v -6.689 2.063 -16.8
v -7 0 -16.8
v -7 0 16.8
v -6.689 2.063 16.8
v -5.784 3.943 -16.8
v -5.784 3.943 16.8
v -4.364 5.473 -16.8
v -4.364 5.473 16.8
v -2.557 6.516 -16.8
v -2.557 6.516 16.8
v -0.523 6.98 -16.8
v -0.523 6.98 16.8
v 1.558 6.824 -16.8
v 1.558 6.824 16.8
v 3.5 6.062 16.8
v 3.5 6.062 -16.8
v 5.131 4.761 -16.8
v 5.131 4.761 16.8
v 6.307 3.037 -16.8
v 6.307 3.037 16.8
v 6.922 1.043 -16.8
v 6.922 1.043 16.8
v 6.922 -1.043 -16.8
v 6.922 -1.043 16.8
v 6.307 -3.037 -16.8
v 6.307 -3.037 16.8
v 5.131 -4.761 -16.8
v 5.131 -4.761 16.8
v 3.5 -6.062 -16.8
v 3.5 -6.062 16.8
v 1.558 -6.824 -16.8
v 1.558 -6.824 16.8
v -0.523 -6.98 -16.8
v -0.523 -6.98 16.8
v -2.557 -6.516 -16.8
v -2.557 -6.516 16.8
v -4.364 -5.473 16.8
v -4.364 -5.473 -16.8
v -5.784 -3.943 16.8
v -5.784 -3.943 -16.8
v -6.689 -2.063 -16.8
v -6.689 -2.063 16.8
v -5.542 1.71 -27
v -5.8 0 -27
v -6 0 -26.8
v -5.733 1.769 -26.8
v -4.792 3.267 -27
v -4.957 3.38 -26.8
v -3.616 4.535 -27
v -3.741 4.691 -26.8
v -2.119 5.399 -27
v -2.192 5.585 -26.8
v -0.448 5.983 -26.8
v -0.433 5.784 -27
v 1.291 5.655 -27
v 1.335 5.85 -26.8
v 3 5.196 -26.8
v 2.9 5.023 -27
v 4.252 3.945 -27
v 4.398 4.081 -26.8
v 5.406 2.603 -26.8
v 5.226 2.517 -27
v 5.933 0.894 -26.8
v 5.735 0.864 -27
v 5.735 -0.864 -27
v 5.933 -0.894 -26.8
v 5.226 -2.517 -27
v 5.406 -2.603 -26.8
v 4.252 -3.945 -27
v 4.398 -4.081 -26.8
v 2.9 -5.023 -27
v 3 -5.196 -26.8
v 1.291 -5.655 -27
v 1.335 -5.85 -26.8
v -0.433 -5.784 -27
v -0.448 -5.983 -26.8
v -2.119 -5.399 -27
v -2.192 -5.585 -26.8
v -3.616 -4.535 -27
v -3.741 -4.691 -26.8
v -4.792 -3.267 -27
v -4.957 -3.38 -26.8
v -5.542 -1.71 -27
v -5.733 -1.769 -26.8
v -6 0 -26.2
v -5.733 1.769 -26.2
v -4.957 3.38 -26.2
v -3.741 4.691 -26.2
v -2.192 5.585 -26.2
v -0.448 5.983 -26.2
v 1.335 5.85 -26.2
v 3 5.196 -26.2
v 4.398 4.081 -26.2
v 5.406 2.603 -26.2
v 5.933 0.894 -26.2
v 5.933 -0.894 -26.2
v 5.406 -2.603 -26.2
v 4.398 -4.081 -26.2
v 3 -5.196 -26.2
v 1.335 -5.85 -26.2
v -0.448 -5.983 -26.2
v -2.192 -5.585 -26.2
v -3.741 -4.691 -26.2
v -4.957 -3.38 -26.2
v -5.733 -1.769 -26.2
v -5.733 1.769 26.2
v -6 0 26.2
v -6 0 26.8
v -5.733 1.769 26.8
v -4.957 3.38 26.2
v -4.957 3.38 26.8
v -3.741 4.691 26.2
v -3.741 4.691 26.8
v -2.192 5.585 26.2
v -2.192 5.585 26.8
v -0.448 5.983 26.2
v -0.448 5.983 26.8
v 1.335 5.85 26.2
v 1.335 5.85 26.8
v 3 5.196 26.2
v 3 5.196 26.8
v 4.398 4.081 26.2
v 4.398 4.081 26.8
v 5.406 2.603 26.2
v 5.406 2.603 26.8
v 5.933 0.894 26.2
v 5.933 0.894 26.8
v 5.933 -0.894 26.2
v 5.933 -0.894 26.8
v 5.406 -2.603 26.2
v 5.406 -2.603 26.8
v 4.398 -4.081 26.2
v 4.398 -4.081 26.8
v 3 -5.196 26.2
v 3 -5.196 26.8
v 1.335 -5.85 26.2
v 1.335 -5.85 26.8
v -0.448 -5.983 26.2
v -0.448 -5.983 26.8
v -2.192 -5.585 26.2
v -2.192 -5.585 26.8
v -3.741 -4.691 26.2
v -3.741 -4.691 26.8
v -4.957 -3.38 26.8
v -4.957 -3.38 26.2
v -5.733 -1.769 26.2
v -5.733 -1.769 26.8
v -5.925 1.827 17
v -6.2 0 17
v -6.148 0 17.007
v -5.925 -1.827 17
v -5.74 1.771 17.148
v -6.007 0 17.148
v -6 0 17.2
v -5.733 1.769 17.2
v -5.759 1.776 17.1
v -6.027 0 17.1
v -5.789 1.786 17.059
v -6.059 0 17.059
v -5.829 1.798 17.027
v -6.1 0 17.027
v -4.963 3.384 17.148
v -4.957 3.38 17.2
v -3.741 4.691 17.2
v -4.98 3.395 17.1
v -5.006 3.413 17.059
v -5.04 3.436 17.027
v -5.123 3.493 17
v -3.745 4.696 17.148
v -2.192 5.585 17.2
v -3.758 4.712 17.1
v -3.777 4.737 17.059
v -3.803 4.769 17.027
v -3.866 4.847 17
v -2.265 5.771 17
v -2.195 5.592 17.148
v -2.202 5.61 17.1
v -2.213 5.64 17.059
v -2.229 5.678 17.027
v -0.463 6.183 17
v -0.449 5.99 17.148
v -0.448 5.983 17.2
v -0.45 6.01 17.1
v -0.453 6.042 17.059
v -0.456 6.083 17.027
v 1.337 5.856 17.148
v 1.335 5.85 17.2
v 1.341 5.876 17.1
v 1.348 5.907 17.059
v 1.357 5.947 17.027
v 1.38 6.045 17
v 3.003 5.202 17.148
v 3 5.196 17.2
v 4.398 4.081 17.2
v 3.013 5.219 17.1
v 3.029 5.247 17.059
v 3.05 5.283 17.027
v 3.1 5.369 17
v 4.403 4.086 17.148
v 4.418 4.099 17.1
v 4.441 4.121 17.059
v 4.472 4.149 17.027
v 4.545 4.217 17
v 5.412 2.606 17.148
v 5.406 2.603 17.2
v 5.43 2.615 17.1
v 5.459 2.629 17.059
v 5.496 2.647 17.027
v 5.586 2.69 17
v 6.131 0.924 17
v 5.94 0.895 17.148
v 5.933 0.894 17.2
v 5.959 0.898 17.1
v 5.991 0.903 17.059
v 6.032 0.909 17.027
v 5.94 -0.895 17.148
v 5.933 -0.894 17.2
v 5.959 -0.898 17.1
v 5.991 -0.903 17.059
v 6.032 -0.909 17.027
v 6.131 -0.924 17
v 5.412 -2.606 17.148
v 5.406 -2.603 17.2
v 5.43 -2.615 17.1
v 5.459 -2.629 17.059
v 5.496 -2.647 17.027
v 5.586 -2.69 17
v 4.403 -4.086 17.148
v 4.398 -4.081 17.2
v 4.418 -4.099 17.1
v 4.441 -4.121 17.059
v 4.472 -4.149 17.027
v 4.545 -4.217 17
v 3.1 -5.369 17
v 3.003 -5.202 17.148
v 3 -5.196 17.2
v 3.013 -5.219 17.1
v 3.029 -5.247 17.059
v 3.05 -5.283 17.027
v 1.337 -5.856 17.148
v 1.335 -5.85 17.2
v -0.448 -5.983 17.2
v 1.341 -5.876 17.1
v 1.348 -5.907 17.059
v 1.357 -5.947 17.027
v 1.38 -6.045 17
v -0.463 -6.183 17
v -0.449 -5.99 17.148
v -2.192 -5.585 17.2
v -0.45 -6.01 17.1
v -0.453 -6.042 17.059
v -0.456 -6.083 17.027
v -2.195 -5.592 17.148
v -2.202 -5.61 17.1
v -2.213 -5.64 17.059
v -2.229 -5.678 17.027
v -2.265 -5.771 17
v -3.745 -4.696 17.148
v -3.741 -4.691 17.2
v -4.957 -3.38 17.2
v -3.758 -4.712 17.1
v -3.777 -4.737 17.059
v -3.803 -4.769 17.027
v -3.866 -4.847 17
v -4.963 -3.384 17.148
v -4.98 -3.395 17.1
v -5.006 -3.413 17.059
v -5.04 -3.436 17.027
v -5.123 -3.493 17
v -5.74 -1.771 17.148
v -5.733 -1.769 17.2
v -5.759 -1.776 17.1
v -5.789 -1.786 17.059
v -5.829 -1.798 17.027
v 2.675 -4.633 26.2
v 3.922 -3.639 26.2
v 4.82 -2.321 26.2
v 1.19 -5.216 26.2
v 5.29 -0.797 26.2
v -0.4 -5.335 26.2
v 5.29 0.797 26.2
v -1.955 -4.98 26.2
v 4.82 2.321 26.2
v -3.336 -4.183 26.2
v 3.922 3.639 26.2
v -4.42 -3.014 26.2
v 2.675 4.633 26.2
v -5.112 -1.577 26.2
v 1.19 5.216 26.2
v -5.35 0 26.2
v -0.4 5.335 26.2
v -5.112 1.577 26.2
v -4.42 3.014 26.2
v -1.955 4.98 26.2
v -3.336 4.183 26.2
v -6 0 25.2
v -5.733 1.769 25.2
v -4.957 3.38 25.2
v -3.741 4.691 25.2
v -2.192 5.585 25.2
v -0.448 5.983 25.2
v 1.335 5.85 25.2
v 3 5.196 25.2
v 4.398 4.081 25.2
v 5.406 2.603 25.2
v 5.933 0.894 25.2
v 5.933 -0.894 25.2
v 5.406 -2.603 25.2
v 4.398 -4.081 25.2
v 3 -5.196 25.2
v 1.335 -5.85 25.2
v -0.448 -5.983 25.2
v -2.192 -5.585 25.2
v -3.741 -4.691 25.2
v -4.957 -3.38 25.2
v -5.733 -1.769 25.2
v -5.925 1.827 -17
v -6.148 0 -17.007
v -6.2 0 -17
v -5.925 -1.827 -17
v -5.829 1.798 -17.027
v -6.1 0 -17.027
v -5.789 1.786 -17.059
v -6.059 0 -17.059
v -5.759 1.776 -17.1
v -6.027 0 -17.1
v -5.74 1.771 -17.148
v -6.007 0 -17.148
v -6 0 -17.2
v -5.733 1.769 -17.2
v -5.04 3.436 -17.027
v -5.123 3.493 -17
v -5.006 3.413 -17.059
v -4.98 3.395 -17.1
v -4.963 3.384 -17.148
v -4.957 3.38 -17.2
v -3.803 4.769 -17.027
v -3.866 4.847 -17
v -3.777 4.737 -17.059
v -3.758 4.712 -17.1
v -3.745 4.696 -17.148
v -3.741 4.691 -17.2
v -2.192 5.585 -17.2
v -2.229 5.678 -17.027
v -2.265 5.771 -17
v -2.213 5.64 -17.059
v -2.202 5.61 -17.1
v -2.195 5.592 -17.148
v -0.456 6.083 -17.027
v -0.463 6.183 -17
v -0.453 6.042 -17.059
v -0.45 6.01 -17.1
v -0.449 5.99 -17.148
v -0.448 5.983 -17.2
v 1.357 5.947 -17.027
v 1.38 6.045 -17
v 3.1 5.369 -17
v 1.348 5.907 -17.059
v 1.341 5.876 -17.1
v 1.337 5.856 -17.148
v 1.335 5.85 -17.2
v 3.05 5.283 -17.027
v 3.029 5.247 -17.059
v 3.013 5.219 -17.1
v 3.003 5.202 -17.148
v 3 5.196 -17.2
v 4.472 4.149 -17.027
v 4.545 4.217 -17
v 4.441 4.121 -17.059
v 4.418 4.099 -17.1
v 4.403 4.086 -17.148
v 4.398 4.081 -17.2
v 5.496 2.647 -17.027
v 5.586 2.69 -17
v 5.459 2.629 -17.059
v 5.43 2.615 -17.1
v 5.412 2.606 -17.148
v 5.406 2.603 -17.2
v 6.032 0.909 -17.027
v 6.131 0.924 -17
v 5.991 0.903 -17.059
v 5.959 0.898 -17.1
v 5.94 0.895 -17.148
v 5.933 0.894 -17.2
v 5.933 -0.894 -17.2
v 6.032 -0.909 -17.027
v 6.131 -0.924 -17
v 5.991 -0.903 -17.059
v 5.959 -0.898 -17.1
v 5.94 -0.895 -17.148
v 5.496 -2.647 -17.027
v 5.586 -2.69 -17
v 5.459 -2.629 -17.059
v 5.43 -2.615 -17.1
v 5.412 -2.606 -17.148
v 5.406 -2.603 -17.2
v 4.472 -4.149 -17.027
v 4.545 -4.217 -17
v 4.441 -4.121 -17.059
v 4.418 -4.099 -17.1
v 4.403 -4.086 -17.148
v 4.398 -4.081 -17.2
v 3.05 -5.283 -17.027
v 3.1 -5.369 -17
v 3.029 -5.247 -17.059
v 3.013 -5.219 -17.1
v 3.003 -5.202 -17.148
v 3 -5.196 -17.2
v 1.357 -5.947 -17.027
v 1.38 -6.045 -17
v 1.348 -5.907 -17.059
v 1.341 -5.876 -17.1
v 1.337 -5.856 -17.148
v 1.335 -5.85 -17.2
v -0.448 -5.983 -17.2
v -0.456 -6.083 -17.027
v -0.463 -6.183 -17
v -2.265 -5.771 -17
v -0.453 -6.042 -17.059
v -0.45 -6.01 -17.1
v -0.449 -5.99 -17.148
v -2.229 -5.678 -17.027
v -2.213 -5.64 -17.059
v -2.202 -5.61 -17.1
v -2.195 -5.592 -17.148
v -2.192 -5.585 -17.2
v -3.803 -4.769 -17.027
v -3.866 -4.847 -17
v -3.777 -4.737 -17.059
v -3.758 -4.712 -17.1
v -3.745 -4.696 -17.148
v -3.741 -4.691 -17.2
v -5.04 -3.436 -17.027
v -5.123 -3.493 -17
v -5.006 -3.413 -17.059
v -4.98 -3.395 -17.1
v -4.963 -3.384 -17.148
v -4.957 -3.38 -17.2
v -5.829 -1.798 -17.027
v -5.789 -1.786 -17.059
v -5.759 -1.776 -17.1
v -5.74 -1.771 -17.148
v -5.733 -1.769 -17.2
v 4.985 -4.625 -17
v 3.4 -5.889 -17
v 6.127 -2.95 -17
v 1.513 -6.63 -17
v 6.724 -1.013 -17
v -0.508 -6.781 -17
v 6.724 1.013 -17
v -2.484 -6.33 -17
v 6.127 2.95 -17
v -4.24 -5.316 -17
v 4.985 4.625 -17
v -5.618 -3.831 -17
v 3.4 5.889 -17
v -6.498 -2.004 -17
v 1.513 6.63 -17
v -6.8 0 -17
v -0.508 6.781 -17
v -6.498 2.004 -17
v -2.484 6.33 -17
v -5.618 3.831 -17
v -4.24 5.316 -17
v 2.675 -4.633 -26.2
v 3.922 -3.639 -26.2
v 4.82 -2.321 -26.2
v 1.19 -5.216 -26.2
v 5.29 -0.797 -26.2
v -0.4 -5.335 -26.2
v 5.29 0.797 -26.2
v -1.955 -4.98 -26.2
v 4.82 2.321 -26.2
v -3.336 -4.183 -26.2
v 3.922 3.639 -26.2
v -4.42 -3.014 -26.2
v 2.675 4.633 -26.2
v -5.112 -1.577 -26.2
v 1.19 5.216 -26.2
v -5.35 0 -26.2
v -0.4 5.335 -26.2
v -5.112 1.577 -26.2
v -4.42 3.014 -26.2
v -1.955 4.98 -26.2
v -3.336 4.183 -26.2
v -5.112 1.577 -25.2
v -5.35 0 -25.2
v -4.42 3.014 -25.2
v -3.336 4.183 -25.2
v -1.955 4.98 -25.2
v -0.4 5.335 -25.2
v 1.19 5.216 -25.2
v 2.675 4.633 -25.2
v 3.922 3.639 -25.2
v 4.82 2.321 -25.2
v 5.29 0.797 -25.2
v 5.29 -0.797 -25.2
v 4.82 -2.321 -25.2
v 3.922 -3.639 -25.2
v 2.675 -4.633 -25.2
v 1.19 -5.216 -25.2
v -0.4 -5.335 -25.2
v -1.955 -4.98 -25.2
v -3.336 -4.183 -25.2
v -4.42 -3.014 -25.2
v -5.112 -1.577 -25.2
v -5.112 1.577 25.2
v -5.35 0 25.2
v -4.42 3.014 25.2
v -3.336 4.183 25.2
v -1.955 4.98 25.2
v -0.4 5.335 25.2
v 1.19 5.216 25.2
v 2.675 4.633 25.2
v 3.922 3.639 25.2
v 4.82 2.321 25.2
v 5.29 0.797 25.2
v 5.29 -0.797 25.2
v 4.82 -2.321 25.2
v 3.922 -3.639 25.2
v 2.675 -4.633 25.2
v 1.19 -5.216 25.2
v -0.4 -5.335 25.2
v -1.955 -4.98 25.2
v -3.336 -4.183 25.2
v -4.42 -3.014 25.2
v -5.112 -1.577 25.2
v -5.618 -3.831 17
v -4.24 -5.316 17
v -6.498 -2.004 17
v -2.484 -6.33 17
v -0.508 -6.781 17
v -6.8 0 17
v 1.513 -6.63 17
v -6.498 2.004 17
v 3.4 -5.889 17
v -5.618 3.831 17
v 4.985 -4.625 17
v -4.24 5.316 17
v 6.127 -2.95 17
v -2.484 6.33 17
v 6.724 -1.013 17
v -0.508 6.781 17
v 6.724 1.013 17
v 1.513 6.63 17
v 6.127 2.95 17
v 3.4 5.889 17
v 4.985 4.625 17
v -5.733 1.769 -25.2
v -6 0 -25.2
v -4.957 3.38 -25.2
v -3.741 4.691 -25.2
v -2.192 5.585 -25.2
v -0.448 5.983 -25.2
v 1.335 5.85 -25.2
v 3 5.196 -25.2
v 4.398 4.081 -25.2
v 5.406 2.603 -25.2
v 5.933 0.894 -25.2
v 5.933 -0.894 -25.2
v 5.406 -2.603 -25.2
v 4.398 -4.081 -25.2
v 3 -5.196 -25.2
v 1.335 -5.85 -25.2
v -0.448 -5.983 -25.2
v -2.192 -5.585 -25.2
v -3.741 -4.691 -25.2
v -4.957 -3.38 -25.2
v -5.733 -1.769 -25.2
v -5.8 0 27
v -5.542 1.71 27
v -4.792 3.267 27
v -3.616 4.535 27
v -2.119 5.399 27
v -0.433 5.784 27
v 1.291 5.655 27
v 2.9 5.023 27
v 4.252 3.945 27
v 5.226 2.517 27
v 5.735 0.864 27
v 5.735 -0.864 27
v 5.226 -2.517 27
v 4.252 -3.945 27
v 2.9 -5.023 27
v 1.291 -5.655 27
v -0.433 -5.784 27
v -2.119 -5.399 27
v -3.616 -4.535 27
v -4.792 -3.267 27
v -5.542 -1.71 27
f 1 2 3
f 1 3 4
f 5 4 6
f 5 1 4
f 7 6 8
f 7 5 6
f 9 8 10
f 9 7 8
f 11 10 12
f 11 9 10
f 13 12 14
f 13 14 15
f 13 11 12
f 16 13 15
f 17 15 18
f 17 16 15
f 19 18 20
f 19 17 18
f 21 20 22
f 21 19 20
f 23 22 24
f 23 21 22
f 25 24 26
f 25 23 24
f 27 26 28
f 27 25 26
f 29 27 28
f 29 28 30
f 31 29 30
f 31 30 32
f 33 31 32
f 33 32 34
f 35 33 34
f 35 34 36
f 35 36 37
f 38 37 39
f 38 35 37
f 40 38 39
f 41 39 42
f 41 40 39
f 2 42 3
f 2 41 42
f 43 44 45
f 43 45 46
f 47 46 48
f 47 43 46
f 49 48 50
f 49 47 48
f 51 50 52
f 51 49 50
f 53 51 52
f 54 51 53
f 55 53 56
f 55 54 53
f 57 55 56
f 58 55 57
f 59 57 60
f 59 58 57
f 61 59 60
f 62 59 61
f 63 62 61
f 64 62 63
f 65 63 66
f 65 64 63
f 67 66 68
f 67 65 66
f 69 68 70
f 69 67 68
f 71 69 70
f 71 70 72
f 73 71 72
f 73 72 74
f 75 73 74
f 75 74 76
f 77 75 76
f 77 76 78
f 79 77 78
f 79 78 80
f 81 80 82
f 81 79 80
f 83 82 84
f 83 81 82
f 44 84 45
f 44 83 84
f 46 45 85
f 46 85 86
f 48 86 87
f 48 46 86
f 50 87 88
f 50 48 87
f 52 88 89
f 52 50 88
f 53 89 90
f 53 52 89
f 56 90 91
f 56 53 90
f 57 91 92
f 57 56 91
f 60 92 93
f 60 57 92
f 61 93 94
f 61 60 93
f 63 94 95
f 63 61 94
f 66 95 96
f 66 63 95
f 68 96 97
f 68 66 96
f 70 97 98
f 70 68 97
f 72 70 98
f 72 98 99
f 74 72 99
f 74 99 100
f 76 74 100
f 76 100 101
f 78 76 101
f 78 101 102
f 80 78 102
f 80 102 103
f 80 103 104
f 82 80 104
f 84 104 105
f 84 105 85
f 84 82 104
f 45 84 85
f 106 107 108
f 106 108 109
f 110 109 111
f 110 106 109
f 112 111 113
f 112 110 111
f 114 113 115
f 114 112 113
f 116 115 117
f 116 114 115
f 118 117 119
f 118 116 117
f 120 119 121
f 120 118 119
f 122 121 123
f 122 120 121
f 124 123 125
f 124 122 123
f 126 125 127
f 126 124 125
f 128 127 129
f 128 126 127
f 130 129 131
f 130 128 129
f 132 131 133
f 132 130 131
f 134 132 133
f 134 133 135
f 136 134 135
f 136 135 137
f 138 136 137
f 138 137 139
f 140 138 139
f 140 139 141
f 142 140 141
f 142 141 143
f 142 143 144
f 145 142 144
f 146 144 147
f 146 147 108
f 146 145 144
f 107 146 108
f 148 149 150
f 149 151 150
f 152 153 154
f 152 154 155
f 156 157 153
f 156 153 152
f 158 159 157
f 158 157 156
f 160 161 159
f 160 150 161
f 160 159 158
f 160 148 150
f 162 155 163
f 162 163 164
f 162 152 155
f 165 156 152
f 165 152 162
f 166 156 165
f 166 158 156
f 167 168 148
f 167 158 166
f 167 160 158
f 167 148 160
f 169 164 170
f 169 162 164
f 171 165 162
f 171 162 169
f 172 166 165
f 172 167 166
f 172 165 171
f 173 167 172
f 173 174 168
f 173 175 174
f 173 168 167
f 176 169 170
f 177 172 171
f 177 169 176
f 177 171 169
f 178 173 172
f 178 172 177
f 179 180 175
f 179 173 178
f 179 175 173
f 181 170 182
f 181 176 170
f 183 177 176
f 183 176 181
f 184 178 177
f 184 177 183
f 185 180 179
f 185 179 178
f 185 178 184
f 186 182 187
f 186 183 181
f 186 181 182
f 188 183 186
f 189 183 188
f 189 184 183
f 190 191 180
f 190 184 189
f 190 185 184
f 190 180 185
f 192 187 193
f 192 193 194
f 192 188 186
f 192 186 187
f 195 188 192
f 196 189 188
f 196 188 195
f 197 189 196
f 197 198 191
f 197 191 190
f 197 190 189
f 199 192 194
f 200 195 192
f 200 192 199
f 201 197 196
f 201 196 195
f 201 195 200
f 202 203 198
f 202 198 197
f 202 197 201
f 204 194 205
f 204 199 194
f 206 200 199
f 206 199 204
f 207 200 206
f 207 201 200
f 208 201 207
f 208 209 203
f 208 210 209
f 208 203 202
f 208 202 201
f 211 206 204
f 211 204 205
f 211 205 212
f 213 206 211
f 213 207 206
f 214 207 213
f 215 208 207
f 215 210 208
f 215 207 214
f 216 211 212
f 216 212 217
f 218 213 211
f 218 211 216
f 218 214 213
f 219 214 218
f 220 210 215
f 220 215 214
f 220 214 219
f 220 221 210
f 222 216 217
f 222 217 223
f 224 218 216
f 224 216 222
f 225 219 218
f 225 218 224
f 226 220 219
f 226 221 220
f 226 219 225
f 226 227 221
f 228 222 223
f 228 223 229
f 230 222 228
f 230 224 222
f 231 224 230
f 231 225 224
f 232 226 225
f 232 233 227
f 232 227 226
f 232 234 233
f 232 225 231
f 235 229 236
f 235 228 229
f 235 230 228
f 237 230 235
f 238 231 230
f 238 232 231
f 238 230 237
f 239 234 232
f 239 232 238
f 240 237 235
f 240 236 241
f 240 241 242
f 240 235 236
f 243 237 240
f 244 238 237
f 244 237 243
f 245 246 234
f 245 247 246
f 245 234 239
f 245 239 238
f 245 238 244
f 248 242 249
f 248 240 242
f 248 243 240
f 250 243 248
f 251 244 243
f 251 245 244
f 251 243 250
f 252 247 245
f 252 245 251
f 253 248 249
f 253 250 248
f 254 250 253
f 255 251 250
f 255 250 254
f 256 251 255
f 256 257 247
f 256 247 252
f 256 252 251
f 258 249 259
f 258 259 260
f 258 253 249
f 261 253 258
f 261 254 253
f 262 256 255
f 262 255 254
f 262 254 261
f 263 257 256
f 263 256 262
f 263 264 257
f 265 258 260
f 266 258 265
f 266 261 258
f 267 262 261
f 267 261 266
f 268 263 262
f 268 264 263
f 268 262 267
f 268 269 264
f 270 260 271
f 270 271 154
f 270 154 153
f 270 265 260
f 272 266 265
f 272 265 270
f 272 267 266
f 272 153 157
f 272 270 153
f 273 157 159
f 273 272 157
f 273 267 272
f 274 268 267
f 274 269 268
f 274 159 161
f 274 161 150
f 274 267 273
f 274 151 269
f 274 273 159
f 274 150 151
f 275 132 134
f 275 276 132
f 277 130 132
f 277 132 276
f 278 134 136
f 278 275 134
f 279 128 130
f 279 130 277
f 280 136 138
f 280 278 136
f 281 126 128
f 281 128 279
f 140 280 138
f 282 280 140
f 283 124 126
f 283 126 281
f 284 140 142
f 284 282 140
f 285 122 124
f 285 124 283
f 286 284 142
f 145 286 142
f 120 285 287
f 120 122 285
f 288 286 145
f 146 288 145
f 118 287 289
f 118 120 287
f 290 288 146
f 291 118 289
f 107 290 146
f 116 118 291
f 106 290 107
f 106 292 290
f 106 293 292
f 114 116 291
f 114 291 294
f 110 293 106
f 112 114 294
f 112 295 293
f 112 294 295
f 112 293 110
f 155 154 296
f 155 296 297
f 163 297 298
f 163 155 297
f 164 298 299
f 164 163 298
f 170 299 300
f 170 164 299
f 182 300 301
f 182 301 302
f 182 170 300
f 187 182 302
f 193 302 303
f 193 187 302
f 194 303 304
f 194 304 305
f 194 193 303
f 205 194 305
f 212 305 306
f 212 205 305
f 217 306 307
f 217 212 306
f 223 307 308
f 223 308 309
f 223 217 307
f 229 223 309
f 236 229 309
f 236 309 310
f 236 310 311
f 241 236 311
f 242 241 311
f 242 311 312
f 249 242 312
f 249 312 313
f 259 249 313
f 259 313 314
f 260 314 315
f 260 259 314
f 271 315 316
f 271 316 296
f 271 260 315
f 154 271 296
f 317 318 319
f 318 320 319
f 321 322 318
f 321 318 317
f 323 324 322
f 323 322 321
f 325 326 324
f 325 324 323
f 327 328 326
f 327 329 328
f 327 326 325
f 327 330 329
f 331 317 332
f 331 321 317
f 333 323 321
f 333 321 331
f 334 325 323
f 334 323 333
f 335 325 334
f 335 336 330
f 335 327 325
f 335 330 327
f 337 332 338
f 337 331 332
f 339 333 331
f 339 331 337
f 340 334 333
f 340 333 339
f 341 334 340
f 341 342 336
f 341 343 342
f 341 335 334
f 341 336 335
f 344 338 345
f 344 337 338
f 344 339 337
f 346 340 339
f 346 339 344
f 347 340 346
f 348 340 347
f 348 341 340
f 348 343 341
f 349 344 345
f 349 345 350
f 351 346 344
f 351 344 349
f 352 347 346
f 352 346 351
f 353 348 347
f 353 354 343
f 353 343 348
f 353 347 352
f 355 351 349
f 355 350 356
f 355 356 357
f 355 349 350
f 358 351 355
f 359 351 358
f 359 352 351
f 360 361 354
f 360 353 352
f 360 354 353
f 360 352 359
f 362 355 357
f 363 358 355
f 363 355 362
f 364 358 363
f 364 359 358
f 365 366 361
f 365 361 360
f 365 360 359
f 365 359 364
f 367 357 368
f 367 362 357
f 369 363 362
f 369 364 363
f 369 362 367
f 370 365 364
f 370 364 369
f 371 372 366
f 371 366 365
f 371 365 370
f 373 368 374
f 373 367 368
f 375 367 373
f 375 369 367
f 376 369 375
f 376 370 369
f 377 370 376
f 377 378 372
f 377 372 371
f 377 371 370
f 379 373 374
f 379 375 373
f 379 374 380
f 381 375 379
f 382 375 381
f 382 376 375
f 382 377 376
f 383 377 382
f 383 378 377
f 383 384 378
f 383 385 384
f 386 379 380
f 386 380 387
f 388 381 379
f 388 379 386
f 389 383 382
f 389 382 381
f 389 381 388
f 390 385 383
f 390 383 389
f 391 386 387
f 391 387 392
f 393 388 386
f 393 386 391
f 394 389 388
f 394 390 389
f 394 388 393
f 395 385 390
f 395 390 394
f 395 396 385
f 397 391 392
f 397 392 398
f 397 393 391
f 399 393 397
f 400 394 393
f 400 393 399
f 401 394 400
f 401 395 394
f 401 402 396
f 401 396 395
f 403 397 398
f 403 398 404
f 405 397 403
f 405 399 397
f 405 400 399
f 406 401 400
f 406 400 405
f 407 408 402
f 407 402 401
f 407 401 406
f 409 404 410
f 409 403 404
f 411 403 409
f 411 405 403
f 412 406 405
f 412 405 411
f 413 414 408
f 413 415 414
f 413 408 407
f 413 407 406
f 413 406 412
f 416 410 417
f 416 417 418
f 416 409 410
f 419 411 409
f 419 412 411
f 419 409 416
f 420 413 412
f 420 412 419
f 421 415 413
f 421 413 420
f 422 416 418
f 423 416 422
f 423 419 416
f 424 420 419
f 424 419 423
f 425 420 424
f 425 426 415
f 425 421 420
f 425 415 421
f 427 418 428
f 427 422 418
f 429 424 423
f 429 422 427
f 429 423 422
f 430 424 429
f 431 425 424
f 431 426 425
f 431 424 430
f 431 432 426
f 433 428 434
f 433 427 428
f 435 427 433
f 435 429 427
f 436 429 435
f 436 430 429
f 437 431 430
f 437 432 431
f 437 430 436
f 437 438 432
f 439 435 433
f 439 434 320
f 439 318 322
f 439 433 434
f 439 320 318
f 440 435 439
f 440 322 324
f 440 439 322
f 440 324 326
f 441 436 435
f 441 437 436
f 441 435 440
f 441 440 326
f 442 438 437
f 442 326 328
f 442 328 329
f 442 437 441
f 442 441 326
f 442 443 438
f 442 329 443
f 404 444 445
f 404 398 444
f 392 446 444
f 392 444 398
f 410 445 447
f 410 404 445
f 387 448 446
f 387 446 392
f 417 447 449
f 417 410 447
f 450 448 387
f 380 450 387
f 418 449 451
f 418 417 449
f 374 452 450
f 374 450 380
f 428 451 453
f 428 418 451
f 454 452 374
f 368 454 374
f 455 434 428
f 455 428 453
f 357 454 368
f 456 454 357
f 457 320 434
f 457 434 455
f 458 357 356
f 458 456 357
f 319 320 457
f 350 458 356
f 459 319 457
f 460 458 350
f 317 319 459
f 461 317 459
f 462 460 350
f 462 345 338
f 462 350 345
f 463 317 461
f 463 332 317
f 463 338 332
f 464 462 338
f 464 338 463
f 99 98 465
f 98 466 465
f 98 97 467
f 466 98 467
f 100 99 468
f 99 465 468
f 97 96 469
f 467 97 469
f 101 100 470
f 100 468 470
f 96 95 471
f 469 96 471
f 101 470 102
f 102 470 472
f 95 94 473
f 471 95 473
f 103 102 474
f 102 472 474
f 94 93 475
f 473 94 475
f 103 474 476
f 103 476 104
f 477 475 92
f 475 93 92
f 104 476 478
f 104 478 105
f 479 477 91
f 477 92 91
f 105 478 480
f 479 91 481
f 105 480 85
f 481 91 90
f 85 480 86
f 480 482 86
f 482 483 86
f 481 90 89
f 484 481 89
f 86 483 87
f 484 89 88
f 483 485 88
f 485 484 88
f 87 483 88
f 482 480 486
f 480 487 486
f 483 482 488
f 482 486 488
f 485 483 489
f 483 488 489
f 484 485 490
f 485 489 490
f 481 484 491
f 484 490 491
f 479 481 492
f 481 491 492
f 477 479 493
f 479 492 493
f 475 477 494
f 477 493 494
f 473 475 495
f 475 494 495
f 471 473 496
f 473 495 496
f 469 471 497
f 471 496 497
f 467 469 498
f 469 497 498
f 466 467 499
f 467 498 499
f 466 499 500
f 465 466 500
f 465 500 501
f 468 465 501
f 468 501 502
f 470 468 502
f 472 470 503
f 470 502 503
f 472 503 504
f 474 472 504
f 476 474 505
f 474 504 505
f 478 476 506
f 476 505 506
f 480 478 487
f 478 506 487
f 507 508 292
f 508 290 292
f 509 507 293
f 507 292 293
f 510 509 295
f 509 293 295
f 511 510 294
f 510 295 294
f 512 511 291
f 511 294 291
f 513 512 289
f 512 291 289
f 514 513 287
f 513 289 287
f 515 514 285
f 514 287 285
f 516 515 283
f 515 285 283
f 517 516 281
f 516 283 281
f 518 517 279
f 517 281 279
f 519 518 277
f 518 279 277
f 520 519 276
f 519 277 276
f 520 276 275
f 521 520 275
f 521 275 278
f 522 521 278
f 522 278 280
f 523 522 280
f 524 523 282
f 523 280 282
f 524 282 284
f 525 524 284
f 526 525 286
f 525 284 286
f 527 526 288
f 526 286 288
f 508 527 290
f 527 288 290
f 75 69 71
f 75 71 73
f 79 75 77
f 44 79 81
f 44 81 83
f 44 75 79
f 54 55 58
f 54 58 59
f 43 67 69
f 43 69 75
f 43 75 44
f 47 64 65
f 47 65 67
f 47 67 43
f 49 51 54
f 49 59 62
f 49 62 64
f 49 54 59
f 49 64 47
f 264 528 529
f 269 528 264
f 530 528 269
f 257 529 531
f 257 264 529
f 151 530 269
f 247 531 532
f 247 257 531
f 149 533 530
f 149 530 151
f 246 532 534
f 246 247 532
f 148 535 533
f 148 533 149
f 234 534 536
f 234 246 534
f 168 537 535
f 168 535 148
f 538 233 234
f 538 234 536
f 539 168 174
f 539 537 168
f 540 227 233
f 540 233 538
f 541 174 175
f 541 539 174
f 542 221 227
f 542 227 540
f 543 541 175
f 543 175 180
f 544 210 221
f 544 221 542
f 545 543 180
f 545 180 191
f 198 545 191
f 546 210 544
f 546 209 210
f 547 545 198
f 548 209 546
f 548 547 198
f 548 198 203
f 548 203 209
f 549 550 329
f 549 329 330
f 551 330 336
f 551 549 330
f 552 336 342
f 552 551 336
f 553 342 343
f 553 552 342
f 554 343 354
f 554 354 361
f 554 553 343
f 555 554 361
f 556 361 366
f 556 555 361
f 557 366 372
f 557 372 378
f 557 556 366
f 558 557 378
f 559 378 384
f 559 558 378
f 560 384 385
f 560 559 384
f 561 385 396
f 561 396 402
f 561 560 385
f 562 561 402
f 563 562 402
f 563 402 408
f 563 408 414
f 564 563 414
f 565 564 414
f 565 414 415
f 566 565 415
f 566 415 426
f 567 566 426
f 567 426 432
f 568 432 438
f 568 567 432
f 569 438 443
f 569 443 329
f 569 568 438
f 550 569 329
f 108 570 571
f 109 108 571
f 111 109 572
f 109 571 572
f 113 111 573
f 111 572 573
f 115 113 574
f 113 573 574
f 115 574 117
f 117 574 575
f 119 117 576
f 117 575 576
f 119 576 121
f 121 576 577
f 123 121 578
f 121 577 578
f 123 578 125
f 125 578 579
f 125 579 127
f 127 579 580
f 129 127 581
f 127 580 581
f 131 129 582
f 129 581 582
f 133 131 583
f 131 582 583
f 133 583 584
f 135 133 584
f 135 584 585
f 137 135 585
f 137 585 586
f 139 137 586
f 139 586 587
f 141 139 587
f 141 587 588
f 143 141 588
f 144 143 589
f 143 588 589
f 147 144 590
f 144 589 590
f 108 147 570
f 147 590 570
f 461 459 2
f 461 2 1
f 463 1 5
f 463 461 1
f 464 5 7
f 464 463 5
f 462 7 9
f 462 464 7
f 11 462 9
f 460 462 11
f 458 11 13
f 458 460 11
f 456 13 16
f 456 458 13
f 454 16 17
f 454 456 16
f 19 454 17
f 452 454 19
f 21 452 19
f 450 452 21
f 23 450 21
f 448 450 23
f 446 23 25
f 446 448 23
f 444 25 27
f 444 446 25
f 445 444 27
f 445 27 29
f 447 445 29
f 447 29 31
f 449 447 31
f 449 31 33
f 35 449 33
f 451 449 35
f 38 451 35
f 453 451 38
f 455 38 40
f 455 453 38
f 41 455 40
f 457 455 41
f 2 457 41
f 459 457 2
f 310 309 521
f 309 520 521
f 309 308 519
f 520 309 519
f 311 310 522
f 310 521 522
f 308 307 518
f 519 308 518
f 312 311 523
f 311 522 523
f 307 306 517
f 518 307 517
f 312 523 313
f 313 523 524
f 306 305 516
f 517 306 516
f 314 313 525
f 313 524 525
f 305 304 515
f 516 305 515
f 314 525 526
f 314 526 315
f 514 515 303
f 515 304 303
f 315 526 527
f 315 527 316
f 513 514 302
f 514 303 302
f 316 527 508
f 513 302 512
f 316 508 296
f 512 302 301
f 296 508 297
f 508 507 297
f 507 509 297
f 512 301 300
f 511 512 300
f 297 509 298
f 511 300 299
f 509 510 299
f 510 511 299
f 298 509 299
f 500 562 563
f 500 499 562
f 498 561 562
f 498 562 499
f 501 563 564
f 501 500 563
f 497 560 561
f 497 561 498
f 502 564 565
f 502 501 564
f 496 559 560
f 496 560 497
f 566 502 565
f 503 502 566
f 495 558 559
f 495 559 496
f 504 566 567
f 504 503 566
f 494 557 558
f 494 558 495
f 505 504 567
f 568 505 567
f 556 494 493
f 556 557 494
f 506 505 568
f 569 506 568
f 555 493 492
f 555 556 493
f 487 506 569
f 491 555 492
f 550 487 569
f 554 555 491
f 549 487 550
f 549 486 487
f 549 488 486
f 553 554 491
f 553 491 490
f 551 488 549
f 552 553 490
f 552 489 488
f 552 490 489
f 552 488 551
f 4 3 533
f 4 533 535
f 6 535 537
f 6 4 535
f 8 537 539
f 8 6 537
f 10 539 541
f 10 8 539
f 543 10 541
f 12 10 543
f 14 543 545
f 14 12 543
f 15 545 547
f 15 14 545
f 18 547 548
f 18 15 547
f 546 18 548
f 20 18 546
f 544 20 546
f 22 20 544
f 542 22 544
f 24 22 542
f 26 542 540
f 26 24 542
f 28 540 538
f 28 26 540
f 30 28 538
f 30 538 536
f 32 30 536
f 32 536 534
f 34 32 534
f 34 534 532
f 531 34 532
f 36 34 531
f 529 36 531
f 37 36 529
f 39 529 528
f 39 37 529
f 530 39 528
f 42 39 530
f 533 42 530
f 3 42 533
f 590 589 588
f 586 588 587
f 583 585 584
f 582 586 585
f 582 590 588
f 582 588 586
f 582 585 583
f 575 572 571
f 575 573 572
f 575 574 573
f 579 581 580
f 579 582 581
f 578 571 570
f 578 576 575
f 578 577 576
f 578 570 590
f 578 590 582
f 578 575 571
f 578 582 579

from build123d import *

# Parameters (mm, degrees)
F2_W    = 0.65
F2_H    = 1
F4_R    = 0.2
F5_SIZE = 0.2


with BuildPart() as f1:
    # F0 (on Front) → F1 (revolve)
    with BuildSketch(Plane.XZ):
        Polygon((0, -27), (0, 27), (-6, 27), (-6, 17), (-7, 17), (-7, -17), (-6, -17), (-6, -27), align=None)
    revolve(axis=Axis((0, 0, -1.756099), (0, 0, -1)))

    # F2 (on Front) → F3 (revolve, cut)
    with BuildSketch(Plane.XZ):
        with Locations((-5.675, 25.7)):
            Rectangle(F2_W, F2_H)
        with Locations((-5.675, -25.7)):
            Rectangle(F2_W, F2_H)
    revolve(axis=Axis((0, 0, 0.721304), (0, 0, -1)), mode=Mode.SUBTRACT)

    # F4
    f4_edges = [f1.edges().sort_by_distance(p)[0] for p in [
        (6, 0, 17),
        (6, 0, -17),
    ]]
    fillet(f4_edges, radius=F4_R)

    # F5
    f5_edges = [f1.edges().sort_by_distance(p)[0] for p in [
        (7, 0, -17),
        (7, 0, 17),
        (6, 0, 27),
        (6, 0, -27),
    ]]
    chamfer(f5_edges, length=F5_SIZE)


solid = f1.part
